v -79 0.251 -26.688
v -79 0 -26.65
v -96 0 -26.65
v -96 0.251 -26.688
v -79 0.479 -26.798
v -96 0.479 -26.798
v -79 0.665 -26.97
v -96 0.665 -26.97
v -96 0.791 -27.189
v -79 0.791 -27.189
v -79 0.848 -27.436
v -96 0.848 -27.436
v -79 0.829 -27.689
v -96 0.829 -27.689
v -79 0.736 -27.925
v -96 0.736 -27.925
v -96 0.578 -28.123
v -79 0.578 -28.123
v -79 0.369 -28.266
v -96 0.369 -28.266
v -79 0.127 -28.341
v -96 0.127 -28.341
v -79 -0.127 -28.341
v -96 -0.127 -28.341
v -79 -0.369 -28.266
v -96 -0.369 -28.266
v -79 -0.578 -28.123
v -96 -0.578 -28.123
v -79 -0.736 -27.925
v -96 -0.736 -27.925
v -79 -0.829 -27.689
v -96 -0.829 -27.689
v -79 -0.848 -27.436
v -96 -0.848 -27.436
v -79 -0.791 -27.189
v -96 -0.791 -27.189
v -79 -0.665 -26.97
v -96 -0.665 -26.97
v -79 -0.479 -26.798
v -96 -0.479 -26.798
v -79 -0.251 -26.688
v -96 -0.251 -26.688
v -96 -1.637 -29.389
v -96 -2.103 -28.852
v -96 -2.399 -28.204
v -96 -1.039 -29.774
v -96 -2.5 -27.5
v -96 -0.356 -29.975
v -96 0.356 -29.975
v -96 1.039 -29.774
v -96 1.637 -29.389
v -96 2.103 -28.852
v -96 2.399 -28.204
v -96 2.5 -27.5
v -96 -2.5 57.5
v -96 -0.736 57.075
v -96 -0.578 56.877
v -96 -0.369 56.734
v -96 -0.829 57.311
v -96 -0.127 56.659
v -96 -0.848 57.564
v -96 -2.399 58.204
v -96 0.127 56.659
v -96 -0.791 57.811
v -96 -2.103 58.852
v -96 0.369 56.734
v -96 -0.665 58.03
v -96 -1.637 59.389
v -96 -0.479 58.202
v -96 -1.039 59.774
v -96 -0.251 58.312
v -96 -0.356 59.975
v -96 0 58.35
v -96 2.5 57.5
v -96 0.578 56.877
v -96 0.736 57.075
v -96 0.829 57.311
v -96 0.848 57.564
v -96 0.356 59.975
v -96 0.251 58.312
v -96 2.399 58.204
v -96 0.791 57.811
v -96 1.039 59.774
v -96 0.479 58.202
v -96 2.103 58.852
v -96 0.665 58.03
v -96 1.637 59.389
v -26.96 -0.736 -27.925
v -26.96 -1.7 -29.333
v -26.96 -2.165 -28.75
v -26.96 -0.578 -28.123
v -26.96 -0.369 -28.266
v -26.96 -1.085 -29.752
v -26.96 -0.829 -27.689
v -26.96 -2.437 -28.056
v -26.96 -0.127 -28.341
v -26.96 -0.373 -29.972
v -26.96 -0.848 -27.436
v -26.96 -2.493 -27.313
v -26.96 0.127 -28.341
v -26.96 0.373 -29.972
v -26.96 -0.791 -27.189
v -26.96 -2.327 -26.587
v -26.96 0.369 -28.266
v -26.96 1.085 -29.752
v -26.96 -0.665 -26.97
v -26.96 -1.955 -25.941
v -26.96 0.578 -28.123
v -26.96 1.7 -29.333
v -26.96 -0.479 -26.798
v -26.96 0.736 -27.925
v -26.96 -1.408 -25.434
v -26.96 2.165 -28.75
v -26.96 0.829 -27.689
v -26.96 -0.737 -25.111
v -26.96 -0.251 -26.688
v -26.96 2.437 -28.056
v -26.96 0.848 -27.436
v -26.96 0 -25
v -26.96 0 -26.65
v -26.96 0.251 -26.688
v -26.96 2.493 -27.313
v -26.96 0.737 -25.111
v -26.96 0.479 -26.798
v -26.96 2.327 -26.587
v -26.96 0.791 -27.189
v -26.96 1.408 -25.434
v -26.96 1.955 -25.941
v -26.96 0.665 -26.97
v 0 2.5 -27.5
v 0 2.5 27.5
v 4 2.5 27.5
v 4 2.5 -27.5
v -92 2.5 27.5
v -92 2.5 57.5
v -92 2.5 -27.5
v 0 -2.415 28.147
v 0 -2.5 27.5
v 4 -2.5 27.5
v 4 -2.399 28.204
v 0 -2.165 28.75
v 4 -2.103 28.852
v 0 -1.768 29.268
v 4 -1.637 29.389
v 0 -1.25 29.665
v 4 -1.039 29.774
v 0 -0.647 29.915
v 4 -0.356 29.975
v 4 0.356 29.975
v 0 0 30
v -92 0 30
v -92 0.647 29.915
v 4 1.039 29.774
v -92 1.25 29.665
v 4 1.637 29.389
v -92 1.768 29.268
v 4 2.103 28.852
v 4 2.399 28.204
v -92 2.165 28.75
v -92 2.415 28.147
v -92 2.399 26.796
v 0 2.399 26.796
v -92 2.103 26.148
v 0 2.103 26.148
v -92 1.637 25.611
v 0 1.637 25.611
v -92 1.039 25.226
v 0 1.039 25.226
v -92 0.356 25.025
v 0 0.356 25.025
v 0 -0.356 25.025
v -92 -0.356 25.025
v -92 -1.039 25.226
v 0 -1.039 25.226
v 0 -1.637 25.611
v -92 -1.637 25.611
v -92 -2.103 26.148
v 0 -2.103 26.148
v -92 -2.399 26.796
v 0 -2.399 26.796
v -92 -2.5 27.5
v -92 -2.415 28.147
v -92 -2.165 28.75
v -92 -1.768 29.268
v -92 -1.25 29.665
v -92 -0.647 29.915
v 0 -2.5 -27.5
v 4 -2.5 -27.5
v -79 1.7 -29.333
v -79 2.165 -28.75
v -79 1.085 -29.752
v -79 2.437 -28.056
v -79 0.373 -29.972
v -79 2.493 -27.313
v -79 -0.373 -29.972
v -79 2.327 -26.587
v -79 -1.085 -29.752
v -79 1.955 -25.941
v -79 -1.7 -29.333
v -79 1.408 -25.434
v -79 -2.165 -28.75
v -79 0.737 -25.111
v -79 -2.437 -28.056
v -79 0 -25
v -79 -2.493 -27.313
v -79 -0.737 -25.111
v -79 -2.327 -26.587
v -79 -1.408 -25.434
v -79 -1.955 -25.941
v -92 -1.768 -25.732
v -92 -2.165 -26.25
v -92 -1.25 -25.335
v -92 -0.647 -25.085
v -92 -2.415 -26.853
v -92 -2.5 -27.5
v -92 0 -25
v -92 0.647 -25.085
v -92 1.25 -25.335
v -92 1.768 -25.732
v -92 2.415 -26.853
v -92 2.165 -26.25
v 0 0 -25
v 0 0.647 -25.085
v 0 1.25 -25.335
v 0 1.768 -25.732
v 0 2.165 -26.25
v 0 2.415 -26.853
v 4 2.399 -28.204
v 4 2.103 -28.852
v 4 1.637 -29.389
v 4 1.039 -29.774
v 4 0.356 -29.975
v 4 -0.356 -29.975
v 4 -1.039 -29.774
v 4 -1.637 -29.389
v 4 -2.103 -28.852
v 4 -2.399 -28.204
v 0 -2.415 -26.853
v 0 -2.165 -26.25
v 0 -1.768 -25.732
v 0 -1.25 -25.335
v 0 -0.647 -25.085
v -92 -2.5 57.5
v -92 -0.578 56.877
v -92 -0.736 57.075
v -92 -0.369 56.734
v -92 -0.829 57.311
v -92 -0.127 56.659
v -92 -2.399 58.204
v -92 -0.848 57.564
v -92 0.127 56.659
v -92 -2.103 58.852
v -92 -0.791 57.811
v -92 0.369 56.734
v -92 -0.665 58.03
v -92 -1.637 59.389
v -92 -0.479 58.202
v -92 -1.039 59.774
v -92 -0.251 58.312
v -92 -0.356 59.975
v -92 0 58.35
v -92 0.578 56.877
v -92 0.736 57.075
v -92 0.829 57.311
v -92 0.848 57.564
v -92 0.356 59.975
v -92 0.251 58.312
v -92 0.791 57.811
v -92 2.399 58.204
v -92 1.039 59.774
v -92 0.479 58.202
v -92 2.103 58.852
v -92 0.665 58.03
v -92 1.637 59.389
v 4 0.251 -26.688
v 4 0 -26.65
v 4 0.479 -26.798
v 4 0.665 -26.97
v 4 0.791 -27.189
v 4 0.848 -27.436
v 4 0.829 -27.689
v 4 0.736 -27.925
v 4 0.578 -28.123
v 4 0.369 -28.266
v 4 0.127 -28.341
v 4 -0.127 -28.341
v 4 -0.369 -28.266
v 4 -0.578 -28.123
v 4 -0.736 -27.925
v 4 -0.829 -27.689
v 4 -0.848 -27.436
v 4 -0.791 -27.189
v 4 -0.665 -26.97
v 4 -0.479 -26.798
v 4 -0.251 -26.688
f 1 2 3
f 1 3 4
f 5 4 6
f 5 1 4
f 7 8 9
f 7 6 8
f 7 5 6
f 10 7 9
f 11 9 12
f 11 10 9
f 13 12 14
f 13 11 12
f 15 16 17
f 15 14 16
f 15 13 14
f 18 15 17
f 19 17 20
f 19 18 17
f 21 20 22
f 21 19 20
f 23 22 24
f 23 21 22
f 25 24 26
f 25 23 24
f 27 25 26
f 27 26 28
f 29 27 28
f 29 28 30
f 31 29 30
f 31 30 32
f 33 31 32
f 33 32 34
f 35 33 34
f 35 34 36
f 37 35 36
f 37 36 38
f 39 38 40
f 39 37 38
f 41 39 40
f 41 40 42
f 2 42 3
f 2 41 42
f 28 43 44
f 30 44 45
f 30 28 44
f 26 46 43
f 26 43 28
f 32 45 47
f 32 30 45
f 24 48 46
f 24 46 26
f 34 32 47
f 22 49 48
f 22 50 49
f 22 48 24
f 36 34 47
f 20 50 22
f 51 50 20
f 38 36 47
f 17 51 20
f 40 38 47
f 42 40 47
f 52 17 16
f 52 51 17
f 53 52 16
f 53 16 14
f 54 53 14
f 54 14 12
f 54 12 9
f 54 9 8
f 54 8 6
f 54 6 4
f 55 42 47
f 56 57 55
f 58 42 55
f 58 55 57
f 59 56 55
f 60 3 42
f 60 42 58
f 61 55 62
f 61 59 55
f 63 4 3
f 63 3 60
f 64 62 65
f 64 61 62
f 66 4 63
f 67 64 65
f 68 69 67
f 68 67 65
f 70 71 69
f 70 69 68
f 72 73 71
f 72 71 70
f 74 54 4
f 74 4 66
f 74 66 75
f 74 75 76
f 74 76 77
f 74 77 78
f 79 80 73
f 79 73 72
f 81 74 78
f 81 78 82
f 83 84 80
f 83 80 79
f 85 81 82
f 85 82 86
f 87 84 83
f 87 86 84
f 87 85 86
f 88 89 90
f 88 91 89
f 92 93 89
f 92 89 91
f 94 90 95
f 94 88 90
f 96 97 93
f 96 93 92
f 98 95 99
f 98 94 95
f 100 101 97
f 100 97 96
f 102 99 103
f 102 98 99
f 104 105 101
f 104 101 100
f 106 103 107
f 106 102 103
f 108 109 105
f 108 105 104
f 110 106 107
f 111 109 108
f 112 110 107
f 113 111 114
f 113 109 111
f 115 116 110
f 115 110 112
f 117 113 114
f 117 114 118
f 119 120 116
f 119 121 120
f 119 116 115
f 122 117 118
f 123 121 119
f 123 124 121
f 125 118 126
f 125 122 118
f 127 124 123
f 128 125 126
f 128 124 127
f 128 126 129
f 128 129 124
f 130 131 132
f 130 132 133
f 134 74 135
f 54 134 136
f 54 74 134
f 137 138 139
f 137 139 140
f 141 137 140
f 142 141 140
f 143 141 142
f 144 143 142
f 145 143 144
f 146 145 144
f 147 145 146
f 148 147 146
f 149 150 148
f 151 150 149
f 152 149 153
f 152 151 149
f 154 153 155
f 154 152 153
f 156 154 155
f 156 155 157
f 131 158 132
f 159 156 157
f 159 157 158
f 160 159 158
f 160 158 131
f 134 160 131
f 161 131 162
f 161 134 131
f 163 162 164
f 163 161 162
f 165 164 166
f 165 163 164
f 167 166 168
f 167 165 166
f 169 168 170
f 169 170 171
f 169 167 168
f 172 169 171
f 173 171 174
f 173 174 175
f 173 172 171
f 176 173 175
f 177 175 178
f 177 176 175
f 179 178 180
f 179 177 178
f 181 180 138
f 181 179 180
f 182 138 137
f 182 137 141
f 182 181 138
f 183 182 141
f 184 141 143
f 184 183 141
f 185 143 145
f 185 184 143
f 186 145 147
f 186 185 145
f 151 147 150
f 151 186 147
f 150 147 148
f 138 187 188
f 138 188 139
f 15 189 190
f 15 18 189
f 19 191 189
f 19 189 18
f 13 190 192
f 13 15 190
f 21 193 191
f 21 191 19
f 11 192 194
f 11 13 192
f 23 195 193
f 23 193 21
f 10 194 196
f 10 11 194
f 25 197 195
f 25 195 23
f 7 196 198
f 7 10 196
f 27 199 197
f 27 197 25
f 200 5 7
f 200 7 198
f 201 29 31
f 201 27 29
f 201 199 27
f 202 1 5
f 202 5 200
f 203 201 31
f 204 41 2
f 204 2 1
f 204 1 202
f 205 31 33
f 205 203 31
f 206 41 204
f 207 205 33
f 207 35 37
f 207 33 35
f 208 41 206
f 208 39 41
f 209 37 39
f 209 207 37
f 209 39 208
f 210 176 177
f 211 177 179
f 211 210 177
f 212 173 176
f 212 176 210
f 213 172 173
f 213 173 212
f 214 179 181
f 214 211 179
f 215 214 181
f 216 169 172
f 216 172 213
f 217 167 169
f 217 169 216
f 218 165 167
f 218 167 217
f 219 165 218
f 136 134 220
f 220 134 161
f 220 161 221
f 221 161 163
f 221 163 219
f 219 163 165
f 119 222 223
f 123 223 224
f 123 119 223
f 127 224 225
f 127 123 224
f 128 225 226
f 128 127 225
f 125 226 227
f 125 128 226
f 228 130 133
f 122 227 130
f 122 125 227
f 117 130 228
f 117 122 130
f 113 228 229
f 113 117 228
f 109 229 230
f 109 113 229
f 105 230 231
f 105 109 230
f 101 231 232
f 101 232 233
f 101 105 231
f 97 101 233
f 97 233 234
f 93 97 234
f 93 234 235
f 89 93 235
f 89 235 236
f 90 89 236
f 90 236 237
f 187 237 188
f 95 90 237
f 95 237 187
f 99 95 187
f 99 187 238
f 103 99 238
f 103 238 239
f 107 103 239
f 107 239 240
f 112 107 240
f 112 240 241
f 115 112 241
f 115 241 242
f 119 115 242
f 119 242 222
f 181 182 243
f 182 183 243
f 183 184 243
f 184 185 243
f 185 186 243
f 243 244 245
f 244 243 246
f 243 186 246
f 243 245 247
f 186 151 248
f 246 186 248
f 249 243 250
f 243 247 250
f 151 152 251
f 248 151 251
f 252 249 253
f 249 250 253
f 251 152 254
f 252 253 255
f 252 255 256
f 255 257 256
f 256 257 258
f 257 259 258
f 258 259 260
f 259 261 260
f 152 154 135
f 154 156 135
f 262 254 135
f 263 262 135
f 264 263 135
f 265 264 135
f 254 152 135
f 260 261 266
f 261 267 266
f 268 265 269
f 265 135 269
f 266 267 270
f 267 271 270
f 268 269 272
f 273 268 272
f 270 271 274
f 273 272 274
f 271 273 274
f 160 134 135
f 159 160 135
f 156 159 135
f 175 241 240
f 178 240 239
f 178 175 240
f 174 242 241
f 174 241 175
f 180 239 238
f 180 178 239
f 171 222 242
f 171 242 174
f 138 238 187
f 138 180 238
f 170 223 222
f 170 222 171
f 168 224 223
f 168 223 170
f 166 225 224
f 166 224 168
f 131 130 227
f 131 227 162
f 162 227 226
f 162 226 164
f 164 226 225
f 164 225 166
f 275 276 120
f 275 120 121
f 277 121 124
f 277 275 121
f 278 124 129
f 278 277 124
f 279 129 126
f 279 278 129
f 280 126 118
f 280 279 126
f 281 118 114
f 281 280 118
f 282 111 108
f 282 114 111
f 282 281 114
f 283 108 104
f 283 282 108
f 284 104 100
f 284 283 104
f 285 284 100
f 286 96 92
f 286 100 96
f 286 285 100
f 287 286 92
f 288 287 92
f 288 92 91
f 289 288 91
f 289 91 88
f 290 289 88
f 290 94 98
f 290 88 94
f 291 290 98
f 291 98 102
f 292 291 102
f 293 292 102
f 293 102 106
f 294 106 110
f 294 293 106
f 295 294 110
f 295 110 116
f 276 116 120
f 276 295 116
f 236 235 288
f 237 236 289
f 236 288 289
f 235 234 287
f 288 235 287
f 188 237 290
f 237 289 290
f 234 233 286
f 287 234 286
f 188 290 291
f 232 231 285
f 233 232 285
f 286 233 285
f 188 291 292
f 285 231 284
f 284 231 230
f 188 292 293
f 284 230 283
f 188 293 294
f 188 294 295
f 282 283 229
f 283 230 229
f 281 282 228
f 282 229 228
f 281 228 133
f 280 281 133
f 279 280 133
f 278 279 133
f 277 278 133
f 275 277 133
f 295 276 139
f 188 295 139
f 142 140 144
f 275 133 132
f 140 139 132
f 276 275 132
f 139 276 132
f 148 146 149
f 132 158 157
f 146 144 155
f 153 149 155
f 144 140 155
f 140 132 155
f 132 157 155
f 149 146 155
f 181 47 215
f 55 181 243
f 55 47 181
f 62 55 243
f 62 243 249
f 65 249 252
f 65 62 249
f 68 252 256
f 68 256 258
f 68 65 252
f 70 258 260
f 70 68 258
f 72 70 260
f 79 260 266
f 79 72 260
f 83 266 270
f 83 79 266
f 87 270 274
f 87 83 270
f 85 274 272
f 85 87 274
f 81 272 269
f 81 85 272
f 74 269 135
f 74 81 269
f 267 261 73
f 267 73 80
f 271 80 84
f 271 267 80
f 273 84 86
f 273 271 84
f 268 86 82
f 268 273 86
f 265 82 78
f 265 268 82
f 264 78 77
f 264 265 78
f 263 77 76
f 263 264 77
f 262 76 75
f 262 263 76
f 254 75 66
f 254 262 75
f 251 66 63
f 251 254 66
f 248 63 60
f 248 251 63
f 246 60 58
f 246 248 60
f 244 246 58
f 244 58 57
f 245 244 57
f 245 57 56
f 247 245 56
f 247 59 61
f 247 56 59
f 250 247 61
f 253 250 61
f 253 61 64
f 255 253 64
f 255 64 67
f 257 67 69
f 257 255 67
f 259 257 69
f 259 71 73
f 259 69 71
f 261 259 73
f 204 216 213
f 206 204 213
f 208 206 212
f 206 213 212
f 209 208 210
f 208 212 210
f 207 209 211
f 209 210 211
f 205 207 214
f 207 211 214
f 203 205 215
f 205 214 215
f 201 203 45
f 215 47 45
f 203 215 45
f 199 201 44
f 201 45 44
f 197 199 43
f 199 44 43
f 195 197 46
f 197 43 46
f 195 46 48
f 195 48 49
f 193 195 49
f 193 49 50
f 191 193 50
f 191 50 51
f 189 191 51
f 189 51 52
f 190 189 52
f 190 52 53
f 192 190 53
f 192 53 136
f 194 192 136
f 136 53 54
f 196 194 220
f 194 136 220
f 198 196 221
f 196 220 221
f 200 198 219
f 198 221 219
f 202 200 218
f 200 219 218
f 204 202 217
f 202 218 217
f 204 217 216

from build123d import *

# Parameters (mm, degrees)
RESSALTO_EXTRUS_O1_DEPTH   = 4
RESSALTO_EXTRUS_O2_START   = 26.96
ESBO_O2_R                  = 2.5
RESSALTO_EXTRUS_O2_DEPTH   = 26.96
RESSALTO_EXTRUS_O3_START   = 92
ESBO_O5_R                  = 2.5
RESSALTO_EXTRUS_O3_DEPTH   = 92
RESSALTO_EXTRUS_O4_START   = 4
RESSALTO_EXTRUS_O4_DEPTH   = 4
ESBO_O7_R                  = 2.5
RESSALTO_EXTRUS_O5_DEPTH   = 13
RESSALTO_EXTRUS_O6_START   = -4
RESSALTO_EXTRUS_O6_DEPTH   = 4
CORTE_EXTRUS_O1_DEPTH      = 92.502850229
CORTE_EXTRUS_O1_DEPTH_BACK = 92.502850229
ESBO_O3_R                  = 0.85
CORTE_EXTRUS_O2_DEPTH      = 117.645831473
CORTE_EXTRUS_O2_DEPTH_BACK = 117.645831473
ESBO_O4_R                  = 0.85


with BuildPart() as part:
    # Esboço1 → Ressalto-extrusão1 (new body)
    with BuildSketch(Plane(origin=(0, 0, 0), x_dir=(0, 0, -1), z_dir=(1, 0, 0))):
        with BuildLine():
            Line((-27.5, 2.5), (27.5, 2.5))
            ThreePointArc((27.5, 2.5), (30, 0), (27.5, -2.5))
            Line((27.5, -2.5), (-27.5, -2.5))
            ThreePointArc((-27.5, -2.5), (-30, 0), (-27.5, 2.5))
        make_face()
    extrude(amount=RESSALTO_EXTRUS_O1_DEPTH)

    # Esboço2 → Ressalto-extrusão2 (add)
    with BuildSketch(Plane.ZY.offset(RESSALTO_EXTRUS_O2_START)):
        with Locations((-27.5, 0)):
            Circle(ESBO_O2_R)
    extrude(amount=-RESSALTO_EXTRUS_O2_DEPTH)

    # Esboço5 → Ressalto-extrusão3 (add)
    with BuildSketch(Plane.ZY.offset(RESSALTO_EXTRUS_O3_START)):
        with Locations((27.5, 0)):
            Circle(ESBO_O5_R)
    extrude(amount=-RESSALTO_EXTRUS_O3_DEPTH)

    # Esboço6 → Ressalto-extrusão4 (add)
    with BuildSketch(Plane.ZY.offset(92).offset(RESSALTO_EXTRUS_O4_START)):
        with BuildLine():
            Line((27.5, -2.5), (-27.5, -2.5))
            ThreePointArc((-27.5, -2.5), (-30, 0), (-27.5, 2.5))
            Line((-27.5, 2.5), (27.5, 2.5))
            ThreePointArc((27.5, 2.5), (30, 0), (27.5, -2.5))
        make_face()
    extrude(amount=-RESSALTO_EXTRUS_O4_DEPTH)

    # Esboço7 → Ressalto-extrusão5 (add)
    with BuildSketch(Plane(origin=(-92, 0, 0), x_dir=(0, 0, -1), z_dir=(1, 0, 0))):
        with Locations(Location((27.5, 0, 0), (0, 0, 180))):
            Circle(ESBO_O7_R)
    extrude(amount=RESSALTO_EXTRUS_O5_DEPTH)

    # Esboço8 → Ressalto-extrusão6 (add)
    with BuildSketch(Plane(origin=(-92, 0, 0), x_dir=(0, 0, -1), z_dir=(1, 0, 0)).offset(RESSALTO_EXTRUS_O6_START)):
        with BuildLine():
            Line((-27.5, -2.5), (-57.5, -2.5))
            ThreePointArc((-57.5, -2.5), (-60, 0), (-57.5, 2.5))
            Line((-57.5, 2.5), (-27.5, 2.5))
            ThreePointArc((-27.5, 2.5), (-25, 0), (-27.5, -2.5))
        make_face()
    extrude(amount=RESSALTO_EXTRUS_O6_DEPTH)

    # Esboço3 → Corte-extrusão1 (cut, two sides: drawn at the far end of the back side and taken through both)
    with BuildSketch(Plane.ZY.offset(26.96).offset(-CORTE_EXTRUS_O1_DEPTH_BACK)):
        with Locations((-27.5, 0)):
            Circle(ESBO_O3_R)
    extrude(amount=CORTE_EXTRUS_O1_DEPTH + CORTE_EXTRUS_O1_DEPTH_BACK, mode=Mode.SUBTRACT)

    # Esboço4 → Corte-extrusão2 (cut, two sides: drawn at the far end of the back side and taken through both)
    with BuildSketch(Plane.ZY.offset(96).offset(-CORTE_EXTRUS_O2_DEPTH_BACK)):
        with Locations((57.5, 0)):
            Circle(ESBO_O4_R)
    extrude(amount=CORTE_EXTRUS_O2_DEPTH + CORTE_EXTRUS_O2_DEPTH_BACK, mode=Mode.SUBTRACT)


solid = part.part
